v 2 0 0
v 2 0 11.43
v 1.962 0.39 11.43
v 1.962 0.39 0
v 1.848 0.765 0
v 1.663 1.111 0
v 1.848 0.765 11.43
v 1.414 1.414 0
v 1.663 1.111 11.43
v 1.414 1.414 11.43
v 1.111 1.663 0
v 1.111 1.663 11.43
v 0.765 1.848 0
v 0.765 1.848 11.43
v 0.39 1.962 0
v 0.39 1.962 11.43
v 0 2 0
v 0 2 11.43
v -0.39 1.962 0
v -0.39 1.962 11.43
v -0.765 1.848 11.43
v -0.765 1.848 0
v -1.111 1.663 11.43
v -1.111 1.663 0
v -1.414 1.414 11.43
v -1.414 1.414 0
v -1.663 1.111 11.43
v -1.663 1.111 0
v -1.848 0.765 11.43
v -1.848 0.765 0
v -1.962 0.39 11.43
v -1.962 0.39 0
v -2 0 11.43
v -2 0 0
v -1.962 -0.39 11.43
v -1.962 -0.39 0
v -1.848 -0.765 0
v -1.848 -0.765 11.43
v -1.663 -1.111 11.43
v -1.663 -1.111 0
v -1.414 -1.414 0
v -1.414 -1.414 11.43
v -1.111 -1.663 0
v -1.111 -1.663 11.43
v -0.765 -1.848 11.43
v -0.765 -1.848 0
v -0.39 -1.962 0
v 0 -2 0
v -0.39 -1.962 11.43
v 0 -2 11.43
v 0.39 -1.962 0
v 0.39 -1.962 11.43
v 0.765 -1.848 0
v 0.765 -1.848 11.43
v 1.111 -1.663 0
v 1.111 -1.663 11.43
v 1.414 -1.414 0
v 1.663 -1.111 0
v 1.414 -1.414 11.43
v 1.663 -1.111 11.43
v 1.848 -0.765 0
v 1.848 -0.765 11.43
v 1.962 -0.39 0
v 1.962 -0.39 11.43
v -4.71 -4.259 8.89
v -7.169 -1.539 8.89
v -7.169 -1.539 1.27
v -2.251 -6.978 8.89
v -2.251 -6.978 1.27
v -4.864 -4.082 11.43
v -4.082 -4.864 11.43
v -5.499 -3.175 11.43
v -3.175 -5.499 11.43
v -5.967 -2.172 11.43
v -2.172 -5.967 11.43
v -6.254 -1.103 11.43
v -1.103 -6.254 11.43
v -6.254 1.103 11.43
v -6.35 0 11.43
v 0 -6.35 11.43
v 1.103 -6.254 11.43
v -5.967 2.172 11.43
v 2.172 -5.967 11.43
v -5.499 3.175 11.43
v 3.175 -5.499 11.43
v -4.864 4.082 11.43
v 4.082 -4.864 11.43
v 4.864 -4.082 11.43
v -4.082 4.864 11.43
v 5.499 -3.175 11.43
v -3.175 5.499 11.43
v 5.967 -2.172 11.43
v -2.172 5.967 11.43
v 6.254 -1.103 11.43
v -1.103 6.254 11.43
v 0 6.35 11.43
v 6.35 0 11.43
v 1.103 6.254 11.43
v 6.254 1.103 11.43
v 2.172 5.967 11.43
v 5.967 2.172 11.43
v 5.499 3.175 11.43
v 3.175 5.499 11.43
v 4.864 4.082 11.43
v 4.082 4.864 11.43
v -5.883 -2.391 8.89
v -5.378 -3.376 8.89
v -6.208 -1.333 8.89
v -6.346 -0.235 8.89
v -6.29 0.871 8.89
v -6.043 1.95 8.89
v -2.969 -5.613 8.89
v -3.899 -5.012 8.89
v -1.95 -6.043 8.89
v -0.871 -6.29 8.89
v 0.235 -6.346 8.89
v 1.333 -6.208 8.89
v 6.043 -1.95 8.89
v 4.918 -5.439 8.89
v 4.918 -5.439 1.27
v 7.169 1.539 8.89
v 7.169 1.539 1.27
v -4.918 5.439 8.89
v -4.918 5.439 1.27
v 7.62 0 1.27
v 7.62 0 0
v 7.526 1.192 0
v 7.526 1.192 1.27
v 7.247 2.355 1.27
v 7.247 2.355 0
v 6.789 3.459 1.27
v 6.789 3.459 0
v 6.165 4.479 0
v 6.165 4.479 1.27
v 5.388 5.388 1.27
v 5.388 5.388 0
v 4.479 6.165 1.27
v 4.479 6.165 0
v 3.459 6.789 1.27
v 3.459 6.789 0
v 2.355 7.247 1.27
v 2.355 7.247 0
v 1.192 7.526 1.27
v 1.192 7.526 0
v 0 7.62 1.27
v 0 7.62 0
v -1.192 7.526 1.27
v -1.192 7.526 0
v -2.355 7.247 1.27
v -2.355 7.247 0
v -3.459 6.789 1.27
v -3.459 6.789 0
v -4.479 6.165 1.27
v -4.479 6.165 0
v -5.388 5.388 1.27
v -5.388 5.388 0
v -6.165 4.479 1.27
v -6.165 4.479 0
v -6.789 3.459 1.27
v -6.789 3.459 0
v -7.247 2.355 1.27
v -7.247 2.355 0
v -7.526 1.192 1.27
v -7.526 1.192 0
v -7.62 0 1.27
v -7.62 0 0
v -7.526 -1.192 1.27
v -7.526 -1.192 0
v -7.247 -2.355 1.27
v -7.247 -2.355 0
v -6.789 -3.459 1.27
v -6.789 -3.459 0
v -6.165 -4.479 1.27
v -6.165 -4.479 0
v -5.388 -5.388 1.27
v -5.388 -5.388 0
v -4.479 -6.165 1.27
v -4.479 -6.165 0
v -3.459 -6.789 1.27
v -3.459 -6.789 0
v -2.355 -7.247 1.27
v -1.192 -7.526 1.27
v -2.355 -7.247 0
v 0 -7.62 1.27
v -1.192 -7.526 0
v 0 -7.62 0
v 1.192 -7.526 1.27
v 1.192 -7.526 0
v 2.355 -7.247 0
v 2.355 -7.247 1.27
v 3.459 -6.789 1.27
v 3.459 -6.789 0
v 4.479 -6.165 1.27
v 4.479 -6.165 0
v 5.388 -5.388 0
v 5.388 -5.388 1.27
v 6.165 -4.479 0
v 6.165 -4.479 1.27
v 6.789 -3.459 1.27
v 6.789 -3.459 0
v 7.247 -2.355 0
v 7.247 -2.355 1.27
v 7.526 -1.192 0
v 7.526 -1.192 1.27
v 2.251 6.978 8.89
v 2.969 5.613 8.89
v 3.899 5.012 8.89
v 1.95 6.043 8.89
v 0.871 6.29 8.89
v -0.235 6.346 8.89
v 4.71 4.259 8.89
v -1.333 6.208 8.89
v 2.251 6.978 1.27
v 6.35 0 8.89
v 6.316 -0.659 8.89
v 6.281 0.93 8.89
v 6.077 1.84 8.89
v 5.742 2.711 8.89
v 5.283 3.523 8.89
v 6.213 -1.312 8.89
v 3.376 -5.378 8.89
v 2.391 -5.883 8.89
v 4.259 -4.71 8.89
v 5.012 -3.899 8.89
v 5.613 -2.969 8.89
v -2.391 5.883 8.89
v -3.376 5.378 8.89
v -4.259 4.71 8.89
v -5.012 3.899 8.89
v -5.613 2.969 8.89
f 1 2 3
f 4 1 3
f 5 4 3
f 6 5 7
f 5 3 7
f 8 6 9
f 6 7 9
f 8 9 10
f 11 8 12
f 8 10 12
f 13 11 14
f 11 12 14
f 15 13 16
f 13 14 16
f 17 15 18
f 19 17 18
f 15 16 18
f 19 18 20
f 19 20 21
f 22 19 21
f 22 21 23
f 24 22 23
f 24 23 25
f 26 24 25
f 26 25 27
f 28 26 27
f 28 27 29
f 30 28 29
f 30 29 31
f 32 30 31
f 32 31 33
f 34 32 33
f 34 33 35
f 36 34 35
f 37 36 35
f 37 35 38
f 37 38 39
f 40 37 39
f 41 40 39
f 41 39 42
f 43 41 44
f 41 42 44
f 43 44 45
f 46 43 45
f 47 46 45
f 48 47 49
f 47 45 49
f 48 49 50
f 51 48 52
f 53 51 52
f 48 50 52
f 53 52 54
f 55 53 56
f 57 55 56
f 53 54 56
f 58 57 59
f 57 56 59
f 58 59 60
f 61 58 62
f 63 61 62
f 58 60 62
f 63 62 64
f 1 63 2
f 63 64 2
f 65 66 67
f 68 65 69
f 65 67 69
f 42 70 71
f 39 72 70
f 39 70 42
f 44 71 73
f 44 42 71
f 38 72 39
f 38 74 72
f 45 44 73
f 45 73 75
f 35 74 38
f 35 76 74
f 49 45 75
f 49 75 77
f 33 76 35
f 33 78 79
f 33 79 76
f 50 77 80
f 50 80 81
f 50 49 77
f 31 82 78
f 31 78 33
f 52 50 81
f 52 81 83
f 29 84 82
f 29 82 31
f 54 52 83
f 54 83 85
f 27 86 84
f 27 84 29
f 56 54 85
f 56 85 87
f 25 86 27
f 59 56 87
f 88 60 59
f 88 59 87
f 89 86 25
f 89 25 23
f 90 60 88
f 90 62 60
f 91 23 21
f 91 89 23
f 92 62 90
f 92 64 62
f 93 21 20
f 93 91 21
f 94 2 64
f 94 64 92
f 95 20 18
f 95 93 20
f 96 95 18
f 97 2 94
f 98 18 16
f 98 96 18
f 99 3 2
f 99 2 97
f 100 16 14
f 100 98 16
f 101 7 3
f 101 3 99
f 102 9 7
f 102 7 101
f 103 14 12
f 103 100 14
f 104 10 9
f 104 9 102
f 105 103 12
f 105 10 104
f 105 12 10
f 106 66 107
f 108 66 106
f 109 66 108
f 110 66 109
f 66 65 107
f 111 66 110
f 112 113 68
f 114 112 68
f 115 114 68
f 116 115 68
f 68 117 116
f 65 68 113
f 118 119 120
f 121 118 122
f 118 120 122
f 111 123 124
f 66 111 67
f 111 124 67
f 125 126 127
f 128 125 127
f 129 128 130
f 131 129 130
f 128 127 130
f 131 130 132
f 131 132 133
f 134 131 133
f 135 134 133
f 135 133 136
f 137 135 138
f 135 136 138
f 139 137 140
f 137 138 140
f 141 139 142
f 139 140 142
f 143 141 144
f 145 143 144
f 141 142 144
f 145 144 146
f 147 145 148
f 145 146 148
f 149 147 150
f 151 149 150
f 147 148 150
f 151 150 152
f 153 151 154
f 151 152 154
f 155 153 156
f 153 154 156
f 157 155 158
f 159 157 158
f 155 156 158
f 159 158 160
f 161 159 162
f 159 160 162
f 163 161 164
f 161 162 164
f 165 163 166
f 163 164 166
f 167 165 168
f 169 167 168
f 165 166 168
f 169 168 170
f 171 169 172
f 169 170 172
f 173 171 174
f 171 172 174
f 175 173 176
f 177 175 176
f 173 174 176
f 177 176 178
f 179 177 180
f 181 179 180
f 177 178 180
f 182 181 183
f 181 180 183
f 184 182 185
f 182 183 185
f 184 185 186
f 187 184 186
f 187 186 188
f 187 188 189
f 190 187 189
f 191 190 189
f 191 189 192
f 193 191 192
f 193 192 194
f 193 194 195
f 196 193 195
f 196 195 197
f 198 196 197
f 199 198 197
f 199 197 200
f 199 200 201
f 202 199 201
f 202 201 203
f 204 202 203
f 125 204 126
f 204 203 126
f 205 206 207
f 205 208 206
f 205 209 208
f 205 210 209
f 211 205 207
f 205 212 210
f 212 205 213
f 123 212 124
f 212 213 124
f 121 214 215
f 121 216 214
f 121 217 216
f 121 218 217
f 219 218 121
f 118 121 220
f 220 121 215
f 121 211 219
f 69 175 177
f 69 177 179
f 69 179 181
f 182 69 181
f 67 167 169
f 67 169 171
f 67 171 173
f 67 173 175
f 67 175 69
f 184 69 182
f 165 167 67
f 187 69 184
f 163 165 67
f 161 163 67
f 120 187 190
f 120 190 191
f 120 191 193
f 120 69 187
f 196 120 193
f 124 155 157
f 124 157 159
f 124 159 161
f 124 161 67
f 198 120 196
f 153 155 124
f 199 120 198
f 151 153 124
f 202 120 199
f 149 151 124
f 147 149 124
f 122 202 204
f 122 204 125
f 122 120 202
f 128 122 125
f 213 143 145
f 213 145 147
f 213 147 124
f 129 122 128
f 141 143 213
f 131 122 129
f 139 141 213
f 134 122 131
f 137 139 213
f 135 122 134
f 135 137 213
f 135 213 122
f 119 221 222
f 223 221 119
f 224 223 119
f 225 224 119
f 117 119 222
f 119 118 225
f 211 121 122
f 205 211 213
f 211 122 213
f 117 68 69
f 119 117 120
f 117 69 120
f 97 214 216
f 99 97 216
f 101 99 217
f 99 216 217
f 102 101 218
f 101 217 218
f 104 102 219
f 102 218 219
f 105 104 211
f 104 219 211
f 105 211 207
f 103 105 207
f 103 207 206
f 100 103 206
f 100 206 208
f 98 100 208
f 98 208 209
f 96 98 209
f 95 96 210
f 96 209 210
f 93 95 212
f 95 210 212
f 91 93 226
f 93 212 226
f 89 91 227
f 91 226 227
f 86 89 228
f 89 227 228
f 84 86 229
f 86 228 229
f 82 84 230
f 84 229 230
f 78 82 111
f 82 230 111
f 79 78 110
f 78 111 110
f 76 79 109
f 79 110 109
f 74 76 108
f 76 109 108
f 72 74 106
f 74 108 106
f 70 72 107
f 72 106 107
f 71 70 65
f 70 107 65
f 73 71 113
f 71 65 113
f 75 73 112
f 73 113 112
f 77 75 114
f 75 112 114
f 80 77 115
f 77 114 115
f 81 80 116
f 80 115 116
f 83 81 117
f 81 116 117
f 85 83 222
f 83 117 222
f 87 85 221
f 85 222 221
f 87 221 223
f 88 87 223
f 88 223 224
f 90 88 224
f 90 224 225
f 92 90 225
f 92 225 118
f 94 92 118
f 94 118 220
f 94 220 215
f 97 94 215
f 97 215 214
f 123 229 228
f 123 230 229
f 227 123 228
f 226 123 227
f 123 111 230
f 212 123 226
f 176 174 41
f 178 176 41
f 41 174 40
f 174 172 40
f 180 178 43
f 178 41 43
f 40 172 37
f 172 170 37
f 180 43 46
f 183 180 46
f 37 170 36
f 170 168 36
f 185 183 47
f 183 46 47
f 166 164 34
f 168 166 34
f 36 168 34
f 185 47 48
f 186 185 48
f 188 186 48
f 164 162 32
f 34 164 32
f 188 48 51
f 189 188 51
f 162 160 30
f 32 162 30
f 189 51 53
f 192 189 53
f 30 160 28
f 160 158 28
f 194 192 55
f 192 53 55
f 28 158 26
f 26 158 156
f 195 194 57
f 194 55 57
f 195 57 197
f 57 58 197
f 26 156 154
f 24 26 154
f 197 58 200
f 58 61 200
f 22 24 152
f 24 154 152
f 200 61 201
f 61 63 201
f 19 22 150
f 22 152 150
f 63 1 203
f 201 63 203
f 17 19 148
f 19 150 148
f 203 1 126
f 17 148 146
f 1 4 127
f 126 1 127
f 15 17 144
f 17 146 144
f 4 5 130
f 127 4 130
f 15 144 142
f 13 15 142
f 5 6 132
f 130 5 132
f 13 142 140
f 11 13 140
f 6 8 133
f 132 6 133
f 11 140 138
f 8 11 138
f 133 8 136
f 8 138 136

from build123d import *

# Parameters (mm, degrees)
SKETCH1_R               = 7.62
BOSS_EXTRUDE1_DEPTH     = 1.27
BOSS_EXTRUDE2_DEPTH     = 7.62
SKETCH4_R               = 6.35
BOSS_EXTRUDE3_DEPTH     = 2.54
SKETCH5_R               = 2
CUT_EXTRUDE1_DEPTH      = 1
CUT_EXTRUDE1_DEPTH_BACK = 12.43


with BuildPart() as part:
    # Sketch1 → Boss-Extrude1 (new body)
    with BuildSketch(Plane.XY):
        Circle(SKETCH1_R)
    extrude(amount=BOSS_EXTRUDE1_DEPTH)

    # Sketch2 → Boss-Extrude2 (add)
    with BuildSketch(Plane.XY.offset(1.27)):
        Polygon((4.917620463, -5.438781327), (7.168933026, 1.539393583), (2.251312563, 6.97817491), (-4.917620463, 5.438781327), (-7.168933026, -1.539393583), (-2.251312563, -6.97817491), align=None)
    extrude(amount=BOSS_EXTRUDE2_DEPTH)

    # Sketch4 → Boss-Extrude3 (add)
    with BuildSketch(Plane.XY.offset(8.89)):
        Circle(SKETCH4_R)
    extrude(amount=BOSS_EXTRUDE3_DEPTH)

    # Sketch5 → Cut-Extrude1 (cut, two sides)
    with BuildSketch(Plane.XY.offset(11.43)) as cut_extrude1_sk:
        Circle(SKETCH5_R)
    extrude(amount=CUT_EXTRUDE1_DEPTH, mode=Mode.SUBTRACT)
    extrude(cut_extrude1_sk.sketch, amount=-CUT_EXTRUDE1_DEPTH_BACK, mode=Mode.SUBTRACT)


solid = part.part
